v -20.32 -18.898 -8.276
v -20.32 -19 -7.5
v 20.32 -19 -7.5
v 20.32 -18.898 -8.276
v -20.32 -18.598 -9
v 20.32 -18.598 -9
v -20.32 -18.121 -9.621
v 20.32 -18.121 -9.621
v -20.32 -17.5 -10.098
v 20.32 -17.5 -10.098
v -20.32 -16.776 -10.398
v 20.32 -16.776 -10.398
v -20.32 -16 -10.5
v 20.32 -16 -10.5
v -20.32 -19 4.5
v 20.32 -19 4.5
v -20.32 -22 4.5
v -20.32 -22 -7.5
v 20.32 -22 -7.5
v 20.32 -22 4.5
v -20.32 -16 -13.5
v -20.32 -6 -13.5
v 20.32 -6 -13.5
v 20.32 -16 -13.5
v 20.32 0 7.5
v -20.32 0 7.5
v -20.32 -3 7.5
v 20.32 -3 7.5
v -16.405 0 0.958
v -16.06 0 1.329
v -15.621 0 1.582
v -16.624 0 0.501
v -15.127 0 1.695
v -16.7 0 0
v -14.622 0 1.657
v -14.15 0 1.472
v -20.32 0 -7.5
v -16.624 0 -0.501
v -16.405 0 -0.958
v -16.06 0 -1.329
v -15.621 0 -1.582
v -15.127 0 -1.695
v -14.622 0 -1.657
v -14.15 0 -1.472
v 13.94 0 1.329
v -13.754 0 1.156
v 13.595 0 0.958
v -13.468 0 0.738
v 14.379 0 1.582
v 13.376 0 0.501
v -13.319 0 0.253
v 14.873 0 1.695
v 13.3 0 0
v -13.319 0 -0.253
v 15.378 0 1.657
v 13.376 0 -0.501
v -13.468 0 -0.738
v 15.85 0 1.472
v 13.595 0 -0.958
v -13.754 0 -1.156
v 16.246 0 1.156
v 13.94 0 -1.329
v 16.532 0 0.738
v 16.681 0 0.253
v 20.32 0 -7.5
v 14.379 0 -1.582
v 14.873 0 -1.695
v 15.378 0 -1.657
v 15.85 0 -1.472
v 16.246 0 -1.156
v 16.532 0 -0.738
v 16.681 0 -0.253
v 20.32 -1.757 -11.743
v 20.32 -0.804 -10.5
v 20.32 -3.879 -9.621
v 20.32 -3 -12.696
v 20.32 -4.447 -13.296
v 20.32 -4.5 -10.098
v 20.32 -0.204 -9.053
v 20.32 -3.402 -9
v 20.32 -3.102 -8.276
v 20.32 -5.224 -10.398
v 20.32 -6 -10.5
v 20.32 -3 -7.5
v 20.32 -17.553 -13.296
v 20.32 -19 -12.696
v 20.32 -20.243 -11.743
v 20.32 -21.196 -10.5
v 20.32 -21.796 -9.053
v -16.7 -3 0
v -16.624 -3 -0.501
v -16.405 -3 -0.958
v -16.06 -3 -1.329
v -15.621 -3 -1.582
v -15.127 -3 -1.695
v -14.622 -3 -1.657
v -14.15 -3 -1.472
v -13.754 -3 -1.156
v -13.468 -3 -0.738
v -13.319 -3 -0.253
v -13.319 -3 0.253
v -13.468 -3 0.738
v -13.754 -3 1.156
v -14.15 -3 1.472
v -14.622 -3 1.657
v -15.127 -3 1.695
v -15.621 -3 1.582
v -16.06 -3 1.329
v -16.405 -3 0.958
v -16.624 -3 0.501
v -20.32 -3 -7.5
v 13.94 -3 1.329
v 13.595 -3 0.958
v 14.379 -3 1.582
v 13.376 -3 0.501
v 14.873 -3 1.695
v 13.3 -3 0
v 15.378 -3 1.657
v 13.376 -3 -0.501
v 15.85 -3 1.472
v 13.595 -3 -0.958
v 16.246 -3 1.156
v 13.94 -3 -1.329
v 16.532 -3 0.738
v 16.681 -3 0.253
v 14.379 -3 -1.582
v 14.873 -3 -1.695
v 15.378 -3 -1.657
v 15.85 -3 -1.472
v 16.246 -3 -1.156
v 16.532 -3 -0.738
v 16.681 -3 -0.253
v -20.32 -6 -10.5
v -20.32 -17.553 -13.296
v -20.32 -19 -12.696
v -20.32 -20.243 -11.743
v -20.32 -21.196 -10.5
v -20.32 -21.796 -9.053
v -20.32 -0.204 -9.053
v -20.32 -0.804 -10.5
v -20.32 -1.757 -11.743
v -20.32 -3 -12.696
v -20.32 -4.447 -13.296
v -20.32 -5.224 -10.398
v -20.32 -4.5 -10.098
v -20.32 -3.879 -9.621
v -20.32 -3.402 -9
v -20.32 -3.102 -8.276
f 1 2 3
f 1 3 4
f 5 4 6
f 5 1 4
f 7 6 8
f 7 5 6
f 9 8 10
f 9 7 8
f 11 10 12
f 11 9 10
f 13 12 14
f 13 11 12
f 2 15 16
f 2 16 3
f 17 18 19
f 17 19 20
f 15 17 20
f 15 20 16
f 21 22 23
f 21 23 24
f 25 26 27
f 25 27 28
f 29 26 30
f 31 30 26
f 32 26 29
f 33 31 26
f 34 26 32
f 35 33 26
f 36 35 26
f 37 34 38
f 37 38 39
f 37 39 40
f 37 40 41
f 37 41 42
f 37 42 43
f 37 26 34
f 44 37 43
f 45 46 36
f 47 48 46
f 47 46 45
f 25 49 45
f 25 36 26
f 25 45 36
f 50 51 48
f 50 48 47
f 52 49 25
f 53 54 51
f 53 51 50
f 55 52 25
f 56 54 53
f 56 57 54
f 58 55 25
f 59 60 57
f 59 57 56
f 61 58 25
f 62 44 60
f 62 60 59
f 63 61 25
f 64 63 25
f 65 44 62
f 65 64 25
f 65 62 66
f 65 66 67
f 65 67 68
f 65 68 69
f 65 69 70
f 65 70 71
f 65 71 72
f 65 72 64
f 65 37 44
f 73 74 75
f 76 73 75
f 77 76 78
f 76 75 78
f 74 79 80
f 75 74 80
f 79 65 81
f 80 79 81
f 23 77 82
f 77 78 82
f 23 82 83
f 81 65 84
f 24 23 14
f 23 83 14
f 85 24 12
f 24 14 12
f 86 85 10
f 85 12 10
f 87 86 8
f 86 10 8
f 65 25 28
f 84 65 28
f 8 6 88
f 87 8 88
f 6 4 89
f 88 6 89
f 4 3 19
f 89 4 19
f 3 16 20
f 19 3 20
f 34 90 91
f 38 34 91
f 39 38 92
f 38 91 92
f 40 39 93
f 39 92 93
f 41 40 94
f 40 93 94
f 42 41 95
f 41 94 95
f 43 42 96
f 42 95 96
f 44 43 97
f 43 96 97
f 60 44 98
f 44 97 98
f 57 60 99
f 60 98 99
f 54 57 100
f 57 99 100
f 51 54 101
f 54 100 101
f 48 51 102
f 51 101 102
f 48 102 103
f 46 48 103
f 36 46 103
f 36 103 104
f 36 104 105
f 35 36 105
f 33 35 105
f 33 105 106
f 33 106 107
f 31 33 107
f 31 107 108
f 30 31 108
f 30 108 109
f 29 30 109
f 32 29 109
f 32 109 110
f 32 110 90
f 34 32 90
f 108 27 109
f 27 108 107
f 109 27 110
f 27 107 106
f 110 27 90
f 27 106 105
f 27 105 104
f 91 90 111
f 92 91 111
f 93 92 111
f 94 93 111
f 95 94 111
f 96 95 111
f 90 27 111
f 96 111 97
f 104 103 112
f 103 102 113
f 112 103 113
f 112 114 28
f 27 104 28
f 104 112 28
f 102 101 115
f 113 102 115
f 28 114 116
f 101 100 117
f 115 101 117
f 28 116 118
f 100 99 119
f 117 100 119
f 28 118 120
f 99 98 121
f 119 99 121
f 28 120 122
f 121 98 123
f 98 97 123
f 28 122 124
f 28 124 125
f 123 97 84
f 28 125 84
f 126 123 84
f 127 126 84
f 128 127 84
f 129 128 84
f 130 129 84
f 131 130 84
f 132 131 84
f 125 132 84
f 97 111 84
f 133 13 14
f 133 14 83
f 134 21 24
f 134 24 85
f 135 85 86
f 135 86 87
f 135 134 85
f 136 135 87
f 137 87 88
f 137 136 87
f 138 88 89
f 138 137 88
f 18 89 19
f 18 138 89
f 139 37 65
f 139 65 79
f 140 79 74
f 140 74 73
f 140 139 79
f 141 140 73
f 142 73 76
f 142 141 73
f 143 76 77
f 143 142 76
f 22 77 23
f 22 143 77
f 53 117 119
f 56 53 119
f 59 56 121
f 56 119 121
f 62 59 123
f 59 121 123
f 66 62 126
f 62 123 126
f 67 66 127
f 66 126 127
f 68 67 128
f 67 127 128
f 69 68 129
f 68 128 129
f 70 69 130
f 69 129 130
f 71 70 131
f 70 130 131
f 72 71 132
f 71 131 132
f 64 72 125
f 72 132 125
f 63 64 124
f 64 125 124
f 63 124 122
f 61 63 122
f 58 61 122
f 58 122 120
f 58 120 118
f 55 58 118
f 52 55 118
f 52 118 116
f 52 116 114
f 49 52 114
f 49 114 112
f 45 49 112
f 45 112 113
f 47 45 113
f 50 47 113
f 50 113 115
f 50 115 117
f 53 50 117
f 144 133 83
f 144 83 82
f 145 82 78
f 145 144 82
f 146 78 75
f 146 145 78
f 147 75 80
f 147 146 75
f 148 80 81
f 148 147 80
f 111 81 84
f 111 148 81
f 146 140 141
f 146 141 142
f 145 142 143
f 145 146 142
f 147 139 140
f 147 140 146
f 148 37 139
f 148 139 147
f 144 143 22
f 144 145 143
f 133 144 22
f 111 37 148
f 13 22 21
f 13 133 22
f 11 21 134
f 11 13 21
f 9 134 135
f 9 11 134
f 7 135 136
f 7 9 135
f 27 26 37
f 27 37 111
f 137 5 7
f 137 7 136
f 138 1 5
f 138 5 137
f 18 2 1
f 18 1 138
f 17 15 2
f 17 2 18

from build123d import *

# Parameters (mm, degrees)
SKETCH2_W                = 40.64
SKETCH2_H                = 15
BASE_FLANGE1_DEPTH       = 3
EDGE_FLANGE1_DEPTH       = 40.64
EDGE_FLANGE2_DEPTH       = 40.64
M3_CLEARANCE_HOLE1_D     = 3.4
M3_CLEARANCE_HOLE1_DEPTH = 3


# Sheet-metal steps are written as plain solids
with BuildPart() as part:
    # Sketch2 → Base-Flange1 (new body)
    with BuildSketch(Plane(origin=(0, 0, 0), x_dir=(1, 0, 0), z_dir=(0, 1, 0))):
        Rectangle(SKETCH2_W, SKETCH2_H)
    extrude(amount=-BASE_FLANGE1_DEPTH)

    # Edge-Flange1 section (across the edge) → Edge-Flange1 (add)
    with BuildSketch(Plane(origin=(-20.32, -3, -10.5), x_dir=(0, 0, 1), z_dir=(1, 0, 0))):
        with BuildLine():
            Line((-3, 3), (-3, 13))
            Line((-3, 13), (0, 13))
            Line((0, 13), (0, 3))
            ThreePointArc((0, 3), (0.878679656, 0.878679656), (3, 0))
            Line((3, 0), (3, -3))
            ThreePointArc((3, -3), (-1.242640687, -1.242640687), (-3, 3))
        make_face()
    extrude(amount=EDGE_FLANGE1_DEPTH)

    # Edge-Flange2 section (across the edge) → Edge-Flange2 (add)
    with BuildSketch(Plane(origin=(-20.32, -19, -10.5), x_dir=(0, 1, 0), z_dir=(1, 0, 0))):
        with BuildLine():
            Line((-3, 3), (-3, 15))
            Line((-3, 15), (0, 15))
            Line((0, 15), (0, 3))
            ThreePointArc((0, 3), (0.878679656, 0.878679656), (3, 0))
            Line((3, 0), (3, -3))
            ThreePointArc((3, -3), (-1.242640687, -1.242640687), (-3, 3))
        make_face()
    extrude(amount=EDGE_FLANGE2_DEPTH)

    # M3 Clearance Hole1
    with Locations(Plane(origin=(0, 0, 0), x_dir=(1, 0, 0), z_dir=(0, 1, 0))):
        with Locations((-15, 0), (15, 0)):
            Hole(M3_CLEARANCE_HOLE1_D / 2, depth=M3_CLEARANCE_HOLE1_DEPTH)


solid = part.part
